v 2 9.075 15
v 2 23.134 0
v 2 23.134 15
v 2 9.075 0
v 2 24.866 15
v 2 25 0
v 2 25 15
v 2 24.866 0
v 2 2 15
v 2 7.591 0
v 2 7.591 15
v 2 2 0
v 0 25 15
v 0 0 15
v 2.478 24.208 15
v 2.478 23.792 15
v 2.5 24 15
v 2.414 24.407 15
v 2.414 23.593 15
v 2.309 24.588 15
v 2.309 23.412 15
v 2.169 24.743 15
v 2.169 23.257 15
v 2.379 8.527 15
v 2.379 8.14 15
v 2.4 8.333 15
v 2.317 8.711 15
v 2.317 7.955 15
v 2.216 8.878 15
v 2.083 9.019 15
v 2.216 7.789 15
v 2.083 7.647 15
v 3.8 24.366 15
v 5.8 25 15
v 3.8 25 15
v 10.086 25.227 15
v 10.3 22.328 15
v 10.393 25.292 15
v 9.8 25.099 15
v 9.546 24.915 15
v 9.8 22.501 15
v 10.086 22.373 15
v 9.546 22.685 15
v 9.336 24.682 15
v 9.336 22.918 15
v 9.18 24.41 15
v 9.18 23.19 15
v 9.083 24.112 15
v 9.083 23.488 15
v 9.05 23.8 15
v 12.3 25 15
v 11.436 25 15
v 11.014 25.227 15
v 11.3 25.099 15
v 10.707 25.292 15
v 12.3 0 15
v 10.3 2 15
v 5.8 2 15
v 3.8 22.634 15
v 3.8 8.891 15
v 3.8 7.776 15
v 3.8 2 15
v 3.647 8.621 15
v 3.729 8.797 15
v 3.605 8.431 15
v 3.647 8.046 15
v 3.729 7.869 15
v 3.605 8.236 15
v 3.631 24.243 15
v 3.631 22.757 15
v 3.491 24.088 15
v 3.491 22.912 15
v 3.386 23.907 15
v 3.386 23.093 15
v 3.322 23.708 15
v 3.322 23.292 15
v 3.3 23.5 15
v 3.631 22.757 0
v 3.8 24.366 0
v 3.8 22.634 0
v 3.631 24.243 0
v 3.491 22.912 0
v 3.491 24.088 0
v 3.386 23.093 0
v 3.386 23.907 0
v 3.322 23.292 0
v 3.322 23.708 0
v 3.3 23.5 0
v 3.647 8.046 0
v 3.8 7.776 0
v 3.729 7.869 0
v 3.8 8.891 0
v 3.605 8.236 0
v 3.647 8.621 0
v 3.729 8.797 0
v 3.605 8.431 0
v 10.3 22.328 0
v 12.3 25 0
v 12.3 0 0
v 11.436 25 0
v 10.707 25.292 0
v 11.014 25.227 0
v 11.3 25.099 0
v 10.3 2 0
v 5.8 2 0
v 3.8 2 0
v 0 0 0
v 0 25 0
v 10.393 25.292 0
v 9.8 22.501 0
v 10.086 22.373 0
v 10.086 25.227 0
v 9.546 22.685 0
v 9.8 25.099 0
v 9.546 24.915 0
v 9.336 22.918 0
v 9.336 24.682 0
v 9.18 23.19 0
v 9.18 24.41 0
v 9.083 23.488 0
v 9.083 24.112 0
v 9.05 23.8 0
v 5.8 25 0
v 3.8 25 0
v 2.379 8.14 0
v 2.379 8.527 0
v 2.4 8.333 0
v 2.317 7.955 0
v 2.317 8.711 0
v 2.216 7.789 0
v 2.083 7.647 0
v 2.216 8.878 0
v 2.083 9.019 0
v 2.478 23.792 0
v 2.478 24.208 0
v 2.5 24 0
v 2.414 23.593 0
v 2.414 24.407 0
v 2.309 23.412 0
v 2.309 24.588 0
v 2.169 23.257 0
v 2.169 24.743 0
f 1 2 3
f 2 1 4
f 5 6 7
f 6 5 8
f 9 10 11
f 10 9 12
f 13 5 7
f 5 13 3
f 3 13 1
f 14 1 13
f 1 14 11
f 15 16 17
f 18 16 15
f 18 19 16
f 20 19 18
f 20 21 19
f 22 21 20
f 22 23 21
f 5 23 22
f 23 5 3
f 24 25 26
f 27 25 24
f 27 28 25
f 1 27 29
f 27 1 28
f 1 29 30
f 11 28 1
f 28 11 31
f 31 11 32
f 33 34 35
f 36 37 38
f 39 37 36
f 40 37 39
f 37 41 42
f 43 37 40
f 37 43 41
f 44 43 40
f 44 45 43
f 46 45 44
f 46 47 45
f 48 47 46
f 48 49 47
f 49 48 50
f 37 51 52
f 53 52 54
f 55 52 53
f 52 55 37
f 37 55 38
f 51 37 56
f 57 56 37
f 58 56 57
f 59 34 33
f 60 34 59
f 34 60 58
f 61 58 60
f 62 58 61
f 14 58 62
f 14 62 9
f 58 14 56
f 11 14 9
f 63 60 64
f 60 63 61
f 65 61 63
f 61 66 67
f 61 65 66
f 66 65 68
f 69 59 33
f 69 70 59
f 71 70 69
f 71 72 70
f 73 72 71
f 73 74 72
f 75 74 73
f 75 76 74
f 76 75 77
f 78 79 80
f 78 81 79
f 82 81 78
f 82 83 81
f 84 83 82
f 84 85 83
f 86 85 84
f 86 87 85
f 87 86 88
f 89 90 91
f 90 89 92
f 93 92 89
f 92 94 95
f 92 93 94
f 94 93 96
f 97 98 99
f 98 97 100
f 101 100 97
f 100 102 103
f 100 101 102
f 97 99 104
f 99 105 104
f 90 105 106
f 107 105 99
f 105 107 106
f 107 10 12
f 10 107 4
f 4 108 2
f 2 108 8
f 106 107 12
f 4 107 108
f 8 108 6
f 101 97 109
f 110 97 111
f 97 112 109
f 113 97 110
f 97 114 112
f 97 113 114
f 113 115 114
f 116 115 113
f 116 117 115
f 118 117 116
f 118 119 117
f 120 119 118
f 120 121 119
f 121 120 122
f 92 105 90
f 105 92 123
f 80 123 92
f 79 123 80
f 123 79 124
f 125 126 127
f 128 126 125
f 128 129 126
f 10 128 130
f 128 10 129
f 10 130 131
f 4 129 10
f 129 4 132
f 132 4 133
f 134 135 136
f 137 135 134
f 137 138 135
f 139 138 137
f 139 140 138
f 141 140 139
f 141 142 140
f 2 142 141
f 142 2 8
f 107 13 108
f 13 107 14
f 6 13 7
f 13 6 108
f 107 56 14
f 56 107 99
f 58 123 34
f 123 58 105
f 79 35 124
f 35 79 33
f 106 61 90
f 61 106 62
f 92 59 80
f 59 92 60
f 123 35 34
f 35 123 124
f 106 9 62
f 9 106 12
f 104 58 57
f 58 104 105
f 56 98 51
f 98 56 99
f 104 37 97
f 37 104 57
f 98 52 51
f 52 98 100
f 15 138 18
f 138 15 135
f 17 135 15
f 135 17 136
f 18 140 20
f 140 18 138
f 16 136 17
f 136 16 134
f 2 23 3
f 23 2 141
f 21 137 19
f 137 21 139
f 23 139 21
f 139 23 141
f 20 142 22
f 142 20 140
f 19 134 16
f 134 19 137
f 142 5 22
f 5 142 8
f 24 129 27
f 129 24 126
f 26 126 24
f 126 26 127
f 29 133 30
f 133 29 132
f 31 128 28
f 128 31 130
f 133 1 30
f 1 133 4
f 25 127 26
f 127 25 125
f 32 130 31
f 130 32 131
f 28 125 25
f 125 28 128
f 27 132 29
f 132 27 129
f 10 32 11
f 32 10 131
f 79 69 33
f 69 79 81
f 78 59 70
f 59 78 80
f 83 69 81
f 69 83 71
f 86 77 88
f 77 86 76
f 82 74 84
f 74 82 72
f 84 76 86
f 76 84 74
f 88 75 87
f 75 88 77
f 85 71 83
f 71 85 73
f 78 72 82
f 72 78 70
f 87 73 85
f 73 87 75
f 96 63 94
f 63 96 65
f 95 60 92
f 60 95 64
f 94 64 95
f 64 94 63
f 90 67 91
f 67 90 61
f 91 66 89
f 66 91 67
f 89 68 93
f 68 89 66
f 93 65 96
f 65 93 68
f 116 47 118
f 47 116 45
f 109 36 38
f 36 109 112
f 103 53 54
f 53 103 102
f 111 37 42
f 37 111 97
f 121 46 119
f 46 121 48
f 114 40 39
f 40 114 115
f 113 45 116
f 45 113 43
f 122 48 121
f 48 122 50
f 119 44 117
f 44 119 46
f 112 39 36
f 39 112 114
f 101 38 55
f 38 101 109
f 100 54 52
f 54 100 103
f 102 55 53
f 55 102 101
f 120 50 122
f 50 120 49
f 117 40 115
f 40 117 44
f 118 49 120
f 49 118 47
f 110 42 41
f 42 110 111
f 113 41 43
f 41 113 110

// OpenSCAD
//Customized customizable Table Clip for having the Ability to 
//Mount Cables on the Frame of a Wanhao Duplicator i3
//Added a second notch to have more grip
//Made additional flat shape 
//Aut0mat3d 2017
//
//Source: http://www.thingiverse.com/thing:165773
//
//CUSTOMIZER VARIABLES
/* [Basic] */
//Round or Flat (1=Flat)
Flat=1;//[0:1]
//Table thickness in /10mm
Table_Thickness=13;//[10:1000]
//Clip Thickness in mm
Clip_Thickness=2;//[2:4]
//Length in mm
Length=25;//[10:50]
//Clip width in mm
Clip_Width=15;//[10:30]
//Max cable diameter in mm
Cable_Diameter=4.5;//[3:20]
//CUSTOMIZER VARIABLES END

$fs=0.2;
if (Flat == 1)
{
    cube ([Clip_Thickness,Length,Clip_Width]);
    translate ([(Table_Thickness/10)+Clip_Thickness+0.5,0,0]) cube ([Clip_Thickness,Length,Clip_Width]);
    cube ([(Table_Thickness/10)+Clip_Thickness*3+Cable_Diameter,Clip_Thickness,Clip_Width]);
    translate ([(Table_Thickness/10)+(Clip_Thickness*2)+Cable_Diameter+0.5,0,0]) cube ([Clip_Thickness,Length,Clip_Width]);
    translate ([Clip_Thickness-0.5,Length-1,0]) cylinder(h=Clip_Width,r=1);
    translate ([Clip_Thickness-0.5,((Length/3)*1),0]) cylinder(h=Clip_Width,r=0.9); //second 
    translate ([(Table_Thickness/10)+Clip_Thickness+1.0,Length-1.5]) cylinder(h=Clip_Width,r=1);
    translate ([((Table_Thickness/10)+Clip_Thickness+1.2),((Length/3)*1)]) cylinder(h=Clip_Width,r=0.9);//second
    //translate ([(Table_Thickness/10)+Clip_Thickness*2.5+Cable_Diameter,Length-(Clip_Thickness*0.7),0]) cylinder(h=Clip_Width,r=Clip_Thickness*0.75);
    translate ([(Table_Thickness/10)+Clip_Thickness*2+0.75+Cable_Diameter,Length-1.2,0]) cylinder(h=Clip_Width,r=1.5);
}

if (Flat == 0)
{
    cube ([Clip_Thickness,Length,Clip_Width]);
    translate ([(Table_Thickness/10)+Clip_Thickness+0.5,0,0]) cube ([Clip_Thickness,Length,Clip_Width]);
    cube ([(Table_Thickness/10)+Clip_Thickness*3+Cable_Diameter,Clip_Thickness,Clip_Width]);
    translate ([Clip_Thickness-0.5,Length-1,0]) cylinder(h=Clip_Width,r=1);
    translate ([Clip_Thickness-0.5,((Length/3)*1),0]) cylinder(h=Clip_Width,r=0.9); //second 
    translate ([(Table_Thickness/10)+Clip_Thickness+1.0,Length-1.5]) cylinder(h=Clip_Width,r=1);
    translate ([((Table_Thickness/10)+Clip_Thickness+1.2),((Length/3)*1)]) cylinder(h=Clip_Width,r=0.9);//second
    translate ([(Table_Thickness/10)+Clip_Thickness*3+Cable_Diameter,Length-Clip_Thickness/2,0]) cylinder(h=Clip_Width,r=Clip_Thickness/2);
    translate ([(Table_Thickness/10)+Clip_Thickness*3+Cable_Diameter,Length/2,0]) difference () {
        cylinder(h=Clip_Width,r=Length/2);
        translate ([0,0,-0.5])cylinder(h=Clip_Width+1,r=Length/2-Clip_Thickness);
        translate ([-Length/2,-Length/2,-0.5]) cube([Length/2,Length,Clip_Width+1]);
        }
    }        
